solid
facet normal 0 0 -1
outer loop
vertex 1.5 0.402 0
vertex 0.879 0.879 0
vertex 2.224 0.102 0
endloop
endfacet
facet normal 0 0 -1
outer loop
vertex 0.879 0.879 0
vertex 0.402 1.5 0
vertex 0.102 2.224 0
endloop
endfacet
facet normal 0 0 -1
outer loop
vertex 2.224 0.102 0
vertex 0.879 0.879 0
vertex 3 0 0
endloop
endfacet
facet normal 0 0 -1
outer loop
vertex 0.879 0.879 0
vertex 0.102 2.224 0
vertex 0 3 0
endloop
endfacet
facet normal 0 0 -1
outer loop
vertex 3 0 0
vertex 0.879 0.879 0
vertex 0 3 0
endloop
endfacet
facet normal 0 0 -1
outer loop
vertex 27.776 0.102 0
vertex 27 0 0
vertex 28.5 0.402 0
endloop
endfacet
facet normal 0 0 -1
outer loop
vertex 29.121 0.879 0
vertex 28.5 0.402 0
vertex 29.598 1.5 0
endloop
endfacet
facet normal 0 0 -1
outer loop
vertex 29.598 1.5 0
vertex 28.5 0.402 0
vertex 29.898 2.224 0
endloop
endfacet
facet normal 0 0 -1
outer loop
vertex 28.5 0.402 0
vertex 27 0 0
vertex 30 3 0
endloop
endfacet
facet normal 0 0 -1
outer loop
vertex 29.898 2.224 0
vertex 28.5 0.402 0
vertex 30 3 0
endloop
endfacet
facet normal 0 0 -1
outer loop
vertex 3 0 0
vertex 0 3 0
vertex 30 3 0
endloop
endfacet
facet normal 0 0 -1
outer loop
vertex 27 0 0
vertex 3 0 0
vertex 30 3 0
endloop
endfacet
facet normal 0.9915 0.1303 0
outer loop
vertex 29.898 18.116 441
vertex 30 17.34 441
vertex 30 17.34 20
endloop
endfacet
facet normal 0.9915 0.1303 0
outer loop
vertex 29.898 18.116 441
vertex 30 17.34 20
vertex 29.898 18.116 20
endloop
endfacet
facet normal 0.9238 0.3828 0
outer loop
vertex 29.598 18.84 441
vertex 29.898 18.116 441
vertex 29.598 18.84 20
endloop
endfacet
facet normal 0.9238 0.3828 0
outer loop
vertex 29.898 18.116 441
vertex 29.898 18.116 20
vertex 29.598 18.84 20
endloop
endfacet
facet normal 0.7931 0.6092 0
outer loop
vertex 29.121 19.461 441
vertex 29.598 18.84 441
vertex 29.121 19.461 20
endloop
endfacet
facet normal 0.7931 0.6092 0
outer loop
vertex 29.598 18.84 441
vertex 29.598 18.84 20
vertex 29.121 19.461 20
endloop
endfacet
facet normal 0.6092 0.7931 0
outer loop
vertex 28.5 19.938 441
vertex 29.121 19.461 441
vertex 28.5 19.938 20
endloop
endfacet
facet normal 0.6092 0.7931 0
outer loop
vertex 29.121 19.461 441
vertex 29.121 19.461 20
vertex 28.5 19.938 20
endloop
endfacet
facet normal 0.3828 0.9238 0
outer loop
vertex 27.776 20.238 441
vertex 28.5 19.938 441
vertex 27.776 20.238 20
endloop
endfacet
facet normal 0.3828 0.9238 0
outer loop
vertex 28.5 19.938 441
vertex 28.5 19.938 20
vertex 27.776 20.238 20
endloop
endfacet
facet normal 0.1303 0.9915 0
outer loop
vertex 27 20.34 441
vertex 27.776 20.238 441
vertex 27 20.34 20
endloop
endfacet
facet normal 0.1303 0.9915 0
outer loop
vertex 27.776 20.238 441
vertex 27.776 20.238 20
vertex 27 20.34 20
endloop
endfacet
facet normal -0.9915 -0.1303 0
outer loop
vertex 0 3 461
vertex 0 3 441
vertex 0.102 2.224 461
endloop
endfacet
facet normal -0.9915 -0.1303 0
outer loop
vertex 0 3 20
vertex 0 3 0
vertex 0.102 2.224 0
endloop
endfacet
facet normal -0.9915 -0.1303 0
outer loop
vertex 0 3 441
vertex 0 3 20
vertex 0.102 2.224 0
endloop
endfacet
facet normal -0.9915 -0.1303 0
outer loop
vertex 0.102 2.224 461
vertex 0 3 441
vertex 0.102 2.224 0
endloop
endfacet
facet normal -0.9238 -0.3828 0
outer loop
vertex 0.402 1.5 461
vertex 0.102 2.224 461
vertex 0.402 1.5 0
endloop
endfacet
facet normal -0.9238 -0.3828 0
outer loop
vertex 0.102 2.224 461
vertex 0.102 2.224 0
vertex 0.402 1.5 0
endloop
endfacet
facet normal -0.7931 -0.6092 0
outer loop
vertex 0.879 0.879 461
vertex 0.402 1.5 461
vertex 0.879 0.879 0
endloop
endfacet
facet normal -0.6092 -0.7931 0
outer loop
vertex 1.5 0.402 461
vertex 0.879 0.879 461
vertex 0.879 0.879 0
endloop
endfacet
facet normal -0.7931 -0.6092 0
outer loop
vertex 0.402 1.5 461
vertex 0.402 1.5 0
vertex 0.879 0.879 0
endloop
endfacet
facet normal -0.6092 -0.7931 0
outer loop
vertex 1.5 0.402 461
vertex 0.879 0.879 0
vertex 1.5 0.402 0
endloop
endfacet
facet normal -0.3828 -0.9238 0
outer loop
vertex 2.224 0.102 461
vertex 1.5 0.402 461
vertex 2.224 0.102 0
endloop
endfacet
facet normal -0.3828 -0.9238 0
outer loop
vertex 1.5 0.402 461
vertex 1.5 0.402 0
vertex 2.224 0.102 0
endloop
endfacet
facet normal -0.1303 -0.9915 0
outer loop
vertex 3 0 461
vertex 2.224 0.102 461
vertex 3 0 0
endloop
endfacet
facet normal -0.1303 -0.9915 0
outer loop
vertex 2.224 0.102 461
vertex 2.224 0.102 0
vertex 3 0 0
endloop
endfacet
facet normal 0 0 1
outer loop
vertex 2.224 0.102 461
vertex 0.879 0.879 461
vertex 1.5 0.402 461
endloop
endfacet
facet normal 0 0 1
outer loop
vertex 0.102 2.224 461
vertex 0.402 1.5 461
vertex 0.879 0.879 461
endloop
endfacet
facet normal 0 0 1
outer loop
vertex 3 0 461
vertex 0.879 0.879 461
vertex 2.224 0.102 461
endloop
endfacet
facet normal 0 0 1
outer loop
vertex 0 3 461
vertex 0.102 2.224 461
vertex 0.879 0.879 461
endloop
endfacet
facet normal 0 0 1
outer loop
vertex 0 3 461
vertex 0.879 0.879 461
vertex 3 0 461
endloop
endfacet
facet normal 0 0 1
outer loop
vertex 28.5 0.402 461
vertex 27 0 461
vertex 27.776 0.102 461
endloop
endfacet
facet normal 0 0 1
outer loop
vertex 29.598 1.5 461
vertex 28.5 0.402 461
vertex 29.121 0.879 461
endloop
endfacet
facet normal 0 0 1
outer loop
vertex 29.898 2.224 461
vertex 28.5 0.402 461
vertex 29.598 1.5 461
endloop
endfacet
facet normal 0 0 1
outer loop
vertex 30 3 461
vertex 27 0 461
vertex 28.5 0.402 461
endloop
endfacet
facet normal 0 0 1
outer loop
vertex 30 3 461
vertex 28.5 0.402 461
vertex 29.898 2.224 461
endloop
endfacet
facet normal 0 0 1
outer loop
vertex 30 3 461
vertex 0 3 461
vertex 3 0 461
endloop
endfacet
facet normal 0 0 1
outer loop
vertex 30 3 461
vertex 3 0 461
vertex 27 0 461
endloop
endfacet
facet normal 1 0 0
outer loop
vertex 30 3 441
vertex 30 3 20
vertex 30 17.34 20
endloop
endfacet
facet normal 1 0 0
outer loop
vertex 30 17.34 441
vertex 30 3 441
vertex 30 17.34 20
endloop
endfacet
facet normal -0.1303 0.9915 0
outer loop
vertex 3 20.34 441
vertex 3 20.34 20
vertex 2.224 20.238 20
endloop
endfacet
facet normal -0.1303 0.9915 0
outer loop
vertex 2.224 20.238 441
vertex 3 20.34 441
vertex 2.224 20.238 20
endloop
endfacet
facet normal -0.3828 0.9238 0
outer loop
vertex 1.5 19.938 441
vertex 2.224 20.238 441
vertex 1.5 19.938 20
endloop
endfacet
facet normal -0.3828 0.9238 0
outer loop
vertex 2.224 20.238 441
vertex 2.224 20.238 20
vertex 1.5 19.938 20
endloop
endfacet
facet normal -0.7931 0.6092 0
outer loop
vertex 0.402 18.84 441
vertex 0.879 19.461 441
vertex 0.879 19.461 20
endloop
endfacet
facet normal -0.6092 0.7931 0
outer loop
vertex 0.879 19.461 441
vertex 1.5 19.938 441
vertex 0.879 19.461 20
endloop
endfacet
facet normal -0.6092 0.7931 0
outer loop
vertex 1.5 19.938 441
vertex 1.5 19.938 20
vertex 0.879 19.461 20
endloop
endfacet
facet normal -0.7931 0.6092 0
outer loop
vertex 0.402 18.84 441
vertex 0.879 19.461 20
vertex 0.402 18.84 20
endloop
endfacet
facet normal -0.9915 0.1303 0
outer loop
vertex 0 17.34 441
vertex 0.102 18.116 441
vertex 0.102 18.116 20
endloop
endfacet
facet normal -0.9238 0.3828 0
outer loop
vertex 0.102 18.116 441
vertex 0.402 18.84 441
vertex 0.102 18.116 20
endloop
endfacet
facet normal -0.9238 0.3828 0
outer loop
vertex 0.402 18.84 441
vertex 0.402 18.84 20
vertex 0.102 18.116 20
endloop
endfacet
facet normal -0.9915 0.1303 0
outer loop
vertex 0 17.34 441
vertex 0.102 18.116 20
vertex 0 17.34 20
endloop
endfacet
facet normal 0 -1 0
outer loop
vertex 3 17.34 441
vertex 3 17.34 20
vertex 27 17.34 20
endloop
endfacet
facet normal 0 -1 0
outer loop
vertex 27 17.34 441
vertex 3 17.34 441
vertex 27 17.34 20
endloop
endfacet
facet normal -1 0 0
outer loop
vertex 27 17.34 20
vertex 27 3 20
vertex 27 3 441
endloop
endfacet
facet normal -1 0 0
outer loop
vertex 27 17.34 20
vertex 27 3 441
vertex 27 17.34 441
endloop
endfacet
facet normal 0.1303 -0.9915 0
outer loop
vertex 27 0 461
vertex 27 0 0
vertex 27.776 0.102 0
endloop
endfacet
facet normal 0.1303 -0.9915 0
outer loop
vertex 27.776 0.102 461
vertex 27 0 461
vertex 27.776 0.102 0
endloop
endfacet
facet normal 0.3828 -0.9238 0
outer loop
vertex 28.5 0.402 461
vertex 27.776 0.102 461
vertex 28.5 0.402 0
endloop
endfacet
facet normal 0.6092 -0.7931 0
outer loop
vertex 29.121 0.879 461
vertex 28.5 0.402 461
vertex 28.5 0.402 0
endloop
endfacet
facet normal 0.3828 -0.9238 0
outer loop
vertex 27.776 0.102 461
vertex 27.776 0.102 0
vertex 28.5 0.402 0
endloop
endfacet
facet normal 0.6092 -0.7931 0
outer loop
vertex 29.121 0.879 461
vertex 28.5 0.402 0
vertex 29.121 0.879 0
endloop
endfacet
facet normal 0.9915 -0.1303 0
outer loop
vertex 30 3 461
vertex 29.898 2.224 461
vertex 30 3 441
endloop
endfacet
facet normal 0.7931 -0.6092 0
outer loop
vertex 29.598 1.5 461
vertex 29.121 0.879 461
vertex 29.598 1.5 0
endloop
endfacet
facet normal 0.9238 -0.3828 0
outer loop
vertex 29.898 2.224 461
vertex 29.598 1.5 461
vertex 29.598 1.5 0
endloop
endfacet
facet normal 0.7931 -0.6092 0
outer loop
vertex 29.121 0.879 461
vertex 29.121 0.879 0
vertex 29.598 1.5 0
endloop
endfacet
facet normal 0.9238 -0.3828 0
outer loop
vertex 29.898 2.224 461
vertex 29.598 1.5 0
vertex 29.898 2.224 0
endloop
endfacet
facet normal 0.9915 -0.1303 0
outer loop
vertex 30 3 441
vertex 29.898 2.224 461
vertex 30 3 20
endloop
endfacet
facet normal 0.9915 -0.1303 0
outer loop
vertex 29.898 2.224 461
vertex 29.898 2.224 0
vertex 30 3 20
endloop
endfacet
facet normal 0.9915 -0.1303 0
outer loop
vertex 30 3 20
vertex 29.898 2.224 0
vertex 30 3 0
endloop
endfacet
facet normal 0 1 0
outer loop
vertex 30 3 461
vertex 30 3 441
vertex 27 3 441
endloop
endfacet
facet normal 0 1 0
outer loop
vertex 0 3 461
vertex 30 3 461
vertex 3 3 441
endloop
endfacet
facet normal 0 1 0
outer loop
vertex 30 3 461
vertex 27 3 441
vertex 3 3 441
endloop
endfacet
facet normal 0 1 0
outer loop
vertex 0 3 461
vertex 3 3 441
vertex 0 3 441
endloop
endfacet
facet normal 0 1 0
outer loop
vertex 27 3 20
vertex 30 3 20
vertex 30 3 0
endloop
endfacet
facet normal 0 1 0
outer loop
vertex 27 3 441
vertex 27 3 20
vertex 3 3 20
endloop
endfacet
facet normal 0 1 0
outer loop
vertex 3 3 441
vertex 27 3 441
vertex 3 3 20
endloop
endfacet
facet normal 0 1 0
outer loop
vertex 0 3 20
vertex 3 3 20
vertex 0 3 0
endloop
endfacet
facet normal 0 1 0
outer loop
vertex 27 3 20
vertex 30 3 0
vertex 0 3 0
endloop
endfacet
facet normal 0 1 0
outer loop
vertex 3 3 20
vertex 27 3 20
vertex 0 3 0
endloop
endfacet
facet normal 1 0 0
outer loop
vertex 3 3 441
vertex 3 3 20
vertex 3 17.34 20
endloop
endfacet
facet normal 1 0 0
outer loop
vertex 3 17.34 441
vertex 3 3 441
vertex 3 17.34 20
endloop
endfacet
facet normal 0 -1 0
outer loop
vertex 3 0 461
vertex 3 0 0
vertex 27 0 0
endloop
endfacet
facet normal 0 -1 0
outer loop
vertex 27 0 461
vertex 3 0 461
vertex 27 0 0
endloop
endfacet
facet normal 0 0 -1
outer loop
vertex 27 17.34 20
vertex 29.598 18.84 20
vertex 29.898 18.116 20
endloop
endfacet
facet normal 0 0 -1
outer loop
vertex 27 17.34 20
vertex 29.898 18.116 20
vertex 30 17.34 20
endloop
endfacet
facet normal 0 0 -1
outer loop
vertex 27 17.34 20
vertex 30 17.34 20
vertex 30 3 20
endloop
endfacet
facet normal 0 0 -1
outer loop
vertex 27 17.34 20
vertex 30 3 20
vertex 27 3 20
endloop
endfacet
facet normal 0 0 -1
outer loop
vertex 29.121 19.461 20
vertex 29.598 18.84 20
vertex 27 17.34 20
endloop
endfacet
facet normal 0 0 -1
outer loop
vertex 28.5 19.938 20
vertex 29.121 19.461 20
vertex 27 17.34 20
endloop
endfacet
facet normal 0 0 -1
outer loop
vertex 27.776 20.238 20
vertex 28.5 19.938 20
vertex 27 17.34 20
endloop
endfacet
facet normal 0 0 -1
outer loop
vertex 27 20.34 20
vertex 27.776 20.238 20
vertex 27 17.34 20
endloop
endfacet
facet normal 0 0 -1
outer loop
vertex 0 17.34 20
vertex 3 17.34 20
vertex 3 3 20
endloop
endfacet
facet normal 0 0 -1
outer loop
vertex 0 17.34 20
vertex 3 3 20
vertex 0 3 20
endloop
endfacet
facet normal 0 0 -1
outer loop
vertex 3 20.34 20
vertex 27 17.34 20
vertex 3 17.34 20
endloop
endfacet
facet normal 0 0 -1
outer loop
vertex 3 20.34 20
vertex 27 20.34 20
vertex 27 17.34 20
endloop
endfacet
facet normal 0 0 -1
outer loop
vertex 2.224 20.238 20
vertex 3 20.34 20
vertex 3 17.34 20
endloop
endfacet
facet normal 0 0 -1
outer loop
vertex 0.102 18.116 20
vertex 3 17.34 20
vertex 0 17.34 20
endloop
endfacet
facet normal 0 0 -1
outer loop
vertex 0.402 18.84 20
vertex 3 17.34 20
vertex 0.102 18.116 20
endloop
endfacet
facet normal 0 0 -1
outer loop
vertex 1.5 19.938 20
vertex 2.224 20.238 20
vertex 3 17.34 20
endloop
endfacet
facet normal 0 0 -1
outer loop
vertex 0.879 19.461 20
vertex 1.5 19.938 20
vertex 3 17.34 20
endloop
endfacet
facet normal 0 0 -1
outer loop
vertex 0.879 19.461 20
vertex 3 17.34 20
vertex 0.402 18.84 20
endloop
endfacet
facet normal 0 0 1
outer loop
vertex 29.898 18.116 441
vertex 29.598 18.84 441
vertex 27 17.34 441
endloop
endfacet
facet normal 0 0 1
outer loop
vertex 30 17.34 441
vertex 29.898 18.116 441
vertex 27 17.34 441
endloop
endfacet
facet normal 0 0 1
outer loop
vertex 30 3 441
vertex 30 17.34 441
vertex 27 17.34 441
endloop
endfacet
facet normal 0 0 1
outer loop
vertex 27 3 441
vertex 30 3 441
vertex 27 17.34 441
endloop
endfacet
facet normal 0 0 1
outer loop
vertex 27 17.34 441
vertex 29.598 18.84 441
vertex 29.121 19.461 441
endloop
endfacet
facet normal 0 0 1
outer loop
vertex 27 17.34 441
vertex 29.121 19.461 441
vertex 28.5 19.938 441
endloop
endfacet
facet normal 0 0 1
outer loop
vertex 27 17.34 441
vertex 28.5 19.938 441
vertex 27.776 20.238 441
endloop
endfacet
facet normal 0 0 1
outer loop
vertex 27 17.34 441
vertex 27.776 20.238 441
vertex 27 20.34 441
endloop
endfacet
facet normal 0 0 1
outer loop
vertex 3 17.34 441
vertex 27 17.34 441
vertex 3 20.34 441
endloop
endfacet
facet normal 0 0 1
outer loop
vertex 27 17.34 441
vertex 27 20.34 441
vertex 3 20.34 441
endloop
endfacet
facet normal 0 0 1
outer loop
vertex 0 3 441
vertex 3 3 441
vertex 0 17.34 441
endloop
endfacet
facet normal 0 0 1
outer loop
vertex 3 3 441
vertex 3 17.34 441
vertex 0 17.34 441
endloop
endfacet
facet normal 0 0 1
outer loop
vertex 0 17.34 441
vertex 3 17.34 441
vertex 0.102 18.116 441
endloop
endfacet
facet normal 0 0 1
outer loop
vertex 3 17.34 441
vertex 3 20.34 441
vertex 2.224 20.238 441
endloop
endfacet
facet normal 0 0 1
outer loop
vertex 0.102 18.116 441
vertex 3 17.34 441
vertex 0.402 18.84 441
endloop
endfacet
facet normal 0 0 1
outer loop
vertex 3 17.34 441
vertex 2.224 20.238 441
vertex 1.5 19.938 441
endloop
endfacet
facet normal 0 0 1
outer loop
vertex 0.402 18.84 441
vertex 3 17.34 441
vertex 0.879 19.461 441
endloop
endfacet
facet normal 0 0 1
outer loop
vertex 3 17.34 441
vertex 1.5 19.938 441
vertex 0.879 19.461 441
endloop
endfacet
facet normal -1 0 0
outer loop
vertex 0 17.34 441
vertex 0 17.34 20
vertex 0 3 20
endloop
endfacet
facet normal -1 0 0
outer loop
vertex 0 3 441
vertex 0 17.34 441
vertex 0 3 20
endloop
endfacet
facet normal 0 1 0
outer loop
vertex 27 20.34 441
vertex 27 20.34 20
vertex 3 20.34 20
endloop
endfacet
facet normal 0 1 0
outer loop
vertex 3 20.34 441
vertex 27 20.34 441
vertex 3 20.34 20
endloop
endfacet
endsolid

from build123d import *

# Parameters (mm, degrees)
SKETCH1_W           = 24
SKETCH1_H           = 14.34
BOSS_EXTRUDE1_DEPTH = 461
CUT_EXTRUDE1_START  = -20
CUT_EXTRUDE1_DEPTH  = 20
CUT_EXTRUDE2_DEPTH  = 20


with BuildPart() as part:
    # Sketch1 → Boss-Extrude1 (new body)
    with BuildSketch(Plane.XY):
        with BuildLine():
            Line((3, 0), (27, 0))
            ThreePointArc((27, 0), (29.121320344, 0.878679656), (30, 3))
            Line((30, 3), (30, 17.34))
            ThreePointArc((30, 17.34), (29.121320344, 19.461320344), (27, 20.34))
            Line((27, 20.34), (3, 20.34))
            ThreePointArc((3, 20.34), (0.878679656, 19.461320344), (0, 17.34))
            Line((0, 17.34), (0, 3))
            ThreePointArc((0, 3), (0.878679656, 0.878679656), (3, 0))
        make_face()
        with Locations((15, 10.17)):
            Rectangle(SKETCH1_W, SKETCH1_H, mode=Mode.SUBTRACT)
    extrude(amount=BOSS_EXTRUDE1_DEPTH)

    # Sketch2 → Cut-Extrude1 (cut)
    with BuildSketch(Plane.XY.offset(461).offset(CUT_EXTRUDE1_START)):
        with BuildLine():
            Line((3, 3), (0, 3))
            Line((0, 3), (0, 17.34))
            ThreePointArc((0, 17.34), (0.878679656, 19.461320344), (3, 20.34))
            Line((3, 20.34), (27, 20.34))
            ThreePointArc((27, 20.34), (29.121320344, 19.461320344), (30, 17.34))
            Line((30, 17.34), (30, 3))
            Line((30, 3), (27, 3))
            Line((27, 3), (27, 17.34))
            Line((27, 17.34), (3, 17.34))
            Line((3, 17.34), (3, 3))
        make_face()
    extrude(amount=CUT_EXTRUDE1_DEPTH, mode=Mode.SUBTRACT)

    # Sketch3 → Cut-Extrude2 (cut)
    with BuildSketch(Plane(origin=(0, 0, 0), x_dir=(-1, 0, 0), z_dir=(0, 0, -1))):
        with BuildLine():
            Line((-27, 3), (-27, 17.34))
            Line((-27, 17.34), (-3, 17.34))
            Line((-3, 17.34), (-3, 3))
            Line((-3, 3), (0, 3))
            Line((0, 3), (0, 17.34))
            ThreePointArc((0, 17.34), (-0.878679656, 19.461320344), (-3, 20.34))
            Line((-3, 20.34), (-27, 20.34))
            ThreePointArc((-27, 20.34), (-29.121320344, 19.461320344), (-30, 17.34))
            Line((-30, 17.34), (-30, 3))
            Line((-30, 3), (-27, 3))
        make_face()
    extrude(amount=-CUT_EXTRUDE2_DEPTH, mode=Mode.SUBTRACT)


solid = part.part
